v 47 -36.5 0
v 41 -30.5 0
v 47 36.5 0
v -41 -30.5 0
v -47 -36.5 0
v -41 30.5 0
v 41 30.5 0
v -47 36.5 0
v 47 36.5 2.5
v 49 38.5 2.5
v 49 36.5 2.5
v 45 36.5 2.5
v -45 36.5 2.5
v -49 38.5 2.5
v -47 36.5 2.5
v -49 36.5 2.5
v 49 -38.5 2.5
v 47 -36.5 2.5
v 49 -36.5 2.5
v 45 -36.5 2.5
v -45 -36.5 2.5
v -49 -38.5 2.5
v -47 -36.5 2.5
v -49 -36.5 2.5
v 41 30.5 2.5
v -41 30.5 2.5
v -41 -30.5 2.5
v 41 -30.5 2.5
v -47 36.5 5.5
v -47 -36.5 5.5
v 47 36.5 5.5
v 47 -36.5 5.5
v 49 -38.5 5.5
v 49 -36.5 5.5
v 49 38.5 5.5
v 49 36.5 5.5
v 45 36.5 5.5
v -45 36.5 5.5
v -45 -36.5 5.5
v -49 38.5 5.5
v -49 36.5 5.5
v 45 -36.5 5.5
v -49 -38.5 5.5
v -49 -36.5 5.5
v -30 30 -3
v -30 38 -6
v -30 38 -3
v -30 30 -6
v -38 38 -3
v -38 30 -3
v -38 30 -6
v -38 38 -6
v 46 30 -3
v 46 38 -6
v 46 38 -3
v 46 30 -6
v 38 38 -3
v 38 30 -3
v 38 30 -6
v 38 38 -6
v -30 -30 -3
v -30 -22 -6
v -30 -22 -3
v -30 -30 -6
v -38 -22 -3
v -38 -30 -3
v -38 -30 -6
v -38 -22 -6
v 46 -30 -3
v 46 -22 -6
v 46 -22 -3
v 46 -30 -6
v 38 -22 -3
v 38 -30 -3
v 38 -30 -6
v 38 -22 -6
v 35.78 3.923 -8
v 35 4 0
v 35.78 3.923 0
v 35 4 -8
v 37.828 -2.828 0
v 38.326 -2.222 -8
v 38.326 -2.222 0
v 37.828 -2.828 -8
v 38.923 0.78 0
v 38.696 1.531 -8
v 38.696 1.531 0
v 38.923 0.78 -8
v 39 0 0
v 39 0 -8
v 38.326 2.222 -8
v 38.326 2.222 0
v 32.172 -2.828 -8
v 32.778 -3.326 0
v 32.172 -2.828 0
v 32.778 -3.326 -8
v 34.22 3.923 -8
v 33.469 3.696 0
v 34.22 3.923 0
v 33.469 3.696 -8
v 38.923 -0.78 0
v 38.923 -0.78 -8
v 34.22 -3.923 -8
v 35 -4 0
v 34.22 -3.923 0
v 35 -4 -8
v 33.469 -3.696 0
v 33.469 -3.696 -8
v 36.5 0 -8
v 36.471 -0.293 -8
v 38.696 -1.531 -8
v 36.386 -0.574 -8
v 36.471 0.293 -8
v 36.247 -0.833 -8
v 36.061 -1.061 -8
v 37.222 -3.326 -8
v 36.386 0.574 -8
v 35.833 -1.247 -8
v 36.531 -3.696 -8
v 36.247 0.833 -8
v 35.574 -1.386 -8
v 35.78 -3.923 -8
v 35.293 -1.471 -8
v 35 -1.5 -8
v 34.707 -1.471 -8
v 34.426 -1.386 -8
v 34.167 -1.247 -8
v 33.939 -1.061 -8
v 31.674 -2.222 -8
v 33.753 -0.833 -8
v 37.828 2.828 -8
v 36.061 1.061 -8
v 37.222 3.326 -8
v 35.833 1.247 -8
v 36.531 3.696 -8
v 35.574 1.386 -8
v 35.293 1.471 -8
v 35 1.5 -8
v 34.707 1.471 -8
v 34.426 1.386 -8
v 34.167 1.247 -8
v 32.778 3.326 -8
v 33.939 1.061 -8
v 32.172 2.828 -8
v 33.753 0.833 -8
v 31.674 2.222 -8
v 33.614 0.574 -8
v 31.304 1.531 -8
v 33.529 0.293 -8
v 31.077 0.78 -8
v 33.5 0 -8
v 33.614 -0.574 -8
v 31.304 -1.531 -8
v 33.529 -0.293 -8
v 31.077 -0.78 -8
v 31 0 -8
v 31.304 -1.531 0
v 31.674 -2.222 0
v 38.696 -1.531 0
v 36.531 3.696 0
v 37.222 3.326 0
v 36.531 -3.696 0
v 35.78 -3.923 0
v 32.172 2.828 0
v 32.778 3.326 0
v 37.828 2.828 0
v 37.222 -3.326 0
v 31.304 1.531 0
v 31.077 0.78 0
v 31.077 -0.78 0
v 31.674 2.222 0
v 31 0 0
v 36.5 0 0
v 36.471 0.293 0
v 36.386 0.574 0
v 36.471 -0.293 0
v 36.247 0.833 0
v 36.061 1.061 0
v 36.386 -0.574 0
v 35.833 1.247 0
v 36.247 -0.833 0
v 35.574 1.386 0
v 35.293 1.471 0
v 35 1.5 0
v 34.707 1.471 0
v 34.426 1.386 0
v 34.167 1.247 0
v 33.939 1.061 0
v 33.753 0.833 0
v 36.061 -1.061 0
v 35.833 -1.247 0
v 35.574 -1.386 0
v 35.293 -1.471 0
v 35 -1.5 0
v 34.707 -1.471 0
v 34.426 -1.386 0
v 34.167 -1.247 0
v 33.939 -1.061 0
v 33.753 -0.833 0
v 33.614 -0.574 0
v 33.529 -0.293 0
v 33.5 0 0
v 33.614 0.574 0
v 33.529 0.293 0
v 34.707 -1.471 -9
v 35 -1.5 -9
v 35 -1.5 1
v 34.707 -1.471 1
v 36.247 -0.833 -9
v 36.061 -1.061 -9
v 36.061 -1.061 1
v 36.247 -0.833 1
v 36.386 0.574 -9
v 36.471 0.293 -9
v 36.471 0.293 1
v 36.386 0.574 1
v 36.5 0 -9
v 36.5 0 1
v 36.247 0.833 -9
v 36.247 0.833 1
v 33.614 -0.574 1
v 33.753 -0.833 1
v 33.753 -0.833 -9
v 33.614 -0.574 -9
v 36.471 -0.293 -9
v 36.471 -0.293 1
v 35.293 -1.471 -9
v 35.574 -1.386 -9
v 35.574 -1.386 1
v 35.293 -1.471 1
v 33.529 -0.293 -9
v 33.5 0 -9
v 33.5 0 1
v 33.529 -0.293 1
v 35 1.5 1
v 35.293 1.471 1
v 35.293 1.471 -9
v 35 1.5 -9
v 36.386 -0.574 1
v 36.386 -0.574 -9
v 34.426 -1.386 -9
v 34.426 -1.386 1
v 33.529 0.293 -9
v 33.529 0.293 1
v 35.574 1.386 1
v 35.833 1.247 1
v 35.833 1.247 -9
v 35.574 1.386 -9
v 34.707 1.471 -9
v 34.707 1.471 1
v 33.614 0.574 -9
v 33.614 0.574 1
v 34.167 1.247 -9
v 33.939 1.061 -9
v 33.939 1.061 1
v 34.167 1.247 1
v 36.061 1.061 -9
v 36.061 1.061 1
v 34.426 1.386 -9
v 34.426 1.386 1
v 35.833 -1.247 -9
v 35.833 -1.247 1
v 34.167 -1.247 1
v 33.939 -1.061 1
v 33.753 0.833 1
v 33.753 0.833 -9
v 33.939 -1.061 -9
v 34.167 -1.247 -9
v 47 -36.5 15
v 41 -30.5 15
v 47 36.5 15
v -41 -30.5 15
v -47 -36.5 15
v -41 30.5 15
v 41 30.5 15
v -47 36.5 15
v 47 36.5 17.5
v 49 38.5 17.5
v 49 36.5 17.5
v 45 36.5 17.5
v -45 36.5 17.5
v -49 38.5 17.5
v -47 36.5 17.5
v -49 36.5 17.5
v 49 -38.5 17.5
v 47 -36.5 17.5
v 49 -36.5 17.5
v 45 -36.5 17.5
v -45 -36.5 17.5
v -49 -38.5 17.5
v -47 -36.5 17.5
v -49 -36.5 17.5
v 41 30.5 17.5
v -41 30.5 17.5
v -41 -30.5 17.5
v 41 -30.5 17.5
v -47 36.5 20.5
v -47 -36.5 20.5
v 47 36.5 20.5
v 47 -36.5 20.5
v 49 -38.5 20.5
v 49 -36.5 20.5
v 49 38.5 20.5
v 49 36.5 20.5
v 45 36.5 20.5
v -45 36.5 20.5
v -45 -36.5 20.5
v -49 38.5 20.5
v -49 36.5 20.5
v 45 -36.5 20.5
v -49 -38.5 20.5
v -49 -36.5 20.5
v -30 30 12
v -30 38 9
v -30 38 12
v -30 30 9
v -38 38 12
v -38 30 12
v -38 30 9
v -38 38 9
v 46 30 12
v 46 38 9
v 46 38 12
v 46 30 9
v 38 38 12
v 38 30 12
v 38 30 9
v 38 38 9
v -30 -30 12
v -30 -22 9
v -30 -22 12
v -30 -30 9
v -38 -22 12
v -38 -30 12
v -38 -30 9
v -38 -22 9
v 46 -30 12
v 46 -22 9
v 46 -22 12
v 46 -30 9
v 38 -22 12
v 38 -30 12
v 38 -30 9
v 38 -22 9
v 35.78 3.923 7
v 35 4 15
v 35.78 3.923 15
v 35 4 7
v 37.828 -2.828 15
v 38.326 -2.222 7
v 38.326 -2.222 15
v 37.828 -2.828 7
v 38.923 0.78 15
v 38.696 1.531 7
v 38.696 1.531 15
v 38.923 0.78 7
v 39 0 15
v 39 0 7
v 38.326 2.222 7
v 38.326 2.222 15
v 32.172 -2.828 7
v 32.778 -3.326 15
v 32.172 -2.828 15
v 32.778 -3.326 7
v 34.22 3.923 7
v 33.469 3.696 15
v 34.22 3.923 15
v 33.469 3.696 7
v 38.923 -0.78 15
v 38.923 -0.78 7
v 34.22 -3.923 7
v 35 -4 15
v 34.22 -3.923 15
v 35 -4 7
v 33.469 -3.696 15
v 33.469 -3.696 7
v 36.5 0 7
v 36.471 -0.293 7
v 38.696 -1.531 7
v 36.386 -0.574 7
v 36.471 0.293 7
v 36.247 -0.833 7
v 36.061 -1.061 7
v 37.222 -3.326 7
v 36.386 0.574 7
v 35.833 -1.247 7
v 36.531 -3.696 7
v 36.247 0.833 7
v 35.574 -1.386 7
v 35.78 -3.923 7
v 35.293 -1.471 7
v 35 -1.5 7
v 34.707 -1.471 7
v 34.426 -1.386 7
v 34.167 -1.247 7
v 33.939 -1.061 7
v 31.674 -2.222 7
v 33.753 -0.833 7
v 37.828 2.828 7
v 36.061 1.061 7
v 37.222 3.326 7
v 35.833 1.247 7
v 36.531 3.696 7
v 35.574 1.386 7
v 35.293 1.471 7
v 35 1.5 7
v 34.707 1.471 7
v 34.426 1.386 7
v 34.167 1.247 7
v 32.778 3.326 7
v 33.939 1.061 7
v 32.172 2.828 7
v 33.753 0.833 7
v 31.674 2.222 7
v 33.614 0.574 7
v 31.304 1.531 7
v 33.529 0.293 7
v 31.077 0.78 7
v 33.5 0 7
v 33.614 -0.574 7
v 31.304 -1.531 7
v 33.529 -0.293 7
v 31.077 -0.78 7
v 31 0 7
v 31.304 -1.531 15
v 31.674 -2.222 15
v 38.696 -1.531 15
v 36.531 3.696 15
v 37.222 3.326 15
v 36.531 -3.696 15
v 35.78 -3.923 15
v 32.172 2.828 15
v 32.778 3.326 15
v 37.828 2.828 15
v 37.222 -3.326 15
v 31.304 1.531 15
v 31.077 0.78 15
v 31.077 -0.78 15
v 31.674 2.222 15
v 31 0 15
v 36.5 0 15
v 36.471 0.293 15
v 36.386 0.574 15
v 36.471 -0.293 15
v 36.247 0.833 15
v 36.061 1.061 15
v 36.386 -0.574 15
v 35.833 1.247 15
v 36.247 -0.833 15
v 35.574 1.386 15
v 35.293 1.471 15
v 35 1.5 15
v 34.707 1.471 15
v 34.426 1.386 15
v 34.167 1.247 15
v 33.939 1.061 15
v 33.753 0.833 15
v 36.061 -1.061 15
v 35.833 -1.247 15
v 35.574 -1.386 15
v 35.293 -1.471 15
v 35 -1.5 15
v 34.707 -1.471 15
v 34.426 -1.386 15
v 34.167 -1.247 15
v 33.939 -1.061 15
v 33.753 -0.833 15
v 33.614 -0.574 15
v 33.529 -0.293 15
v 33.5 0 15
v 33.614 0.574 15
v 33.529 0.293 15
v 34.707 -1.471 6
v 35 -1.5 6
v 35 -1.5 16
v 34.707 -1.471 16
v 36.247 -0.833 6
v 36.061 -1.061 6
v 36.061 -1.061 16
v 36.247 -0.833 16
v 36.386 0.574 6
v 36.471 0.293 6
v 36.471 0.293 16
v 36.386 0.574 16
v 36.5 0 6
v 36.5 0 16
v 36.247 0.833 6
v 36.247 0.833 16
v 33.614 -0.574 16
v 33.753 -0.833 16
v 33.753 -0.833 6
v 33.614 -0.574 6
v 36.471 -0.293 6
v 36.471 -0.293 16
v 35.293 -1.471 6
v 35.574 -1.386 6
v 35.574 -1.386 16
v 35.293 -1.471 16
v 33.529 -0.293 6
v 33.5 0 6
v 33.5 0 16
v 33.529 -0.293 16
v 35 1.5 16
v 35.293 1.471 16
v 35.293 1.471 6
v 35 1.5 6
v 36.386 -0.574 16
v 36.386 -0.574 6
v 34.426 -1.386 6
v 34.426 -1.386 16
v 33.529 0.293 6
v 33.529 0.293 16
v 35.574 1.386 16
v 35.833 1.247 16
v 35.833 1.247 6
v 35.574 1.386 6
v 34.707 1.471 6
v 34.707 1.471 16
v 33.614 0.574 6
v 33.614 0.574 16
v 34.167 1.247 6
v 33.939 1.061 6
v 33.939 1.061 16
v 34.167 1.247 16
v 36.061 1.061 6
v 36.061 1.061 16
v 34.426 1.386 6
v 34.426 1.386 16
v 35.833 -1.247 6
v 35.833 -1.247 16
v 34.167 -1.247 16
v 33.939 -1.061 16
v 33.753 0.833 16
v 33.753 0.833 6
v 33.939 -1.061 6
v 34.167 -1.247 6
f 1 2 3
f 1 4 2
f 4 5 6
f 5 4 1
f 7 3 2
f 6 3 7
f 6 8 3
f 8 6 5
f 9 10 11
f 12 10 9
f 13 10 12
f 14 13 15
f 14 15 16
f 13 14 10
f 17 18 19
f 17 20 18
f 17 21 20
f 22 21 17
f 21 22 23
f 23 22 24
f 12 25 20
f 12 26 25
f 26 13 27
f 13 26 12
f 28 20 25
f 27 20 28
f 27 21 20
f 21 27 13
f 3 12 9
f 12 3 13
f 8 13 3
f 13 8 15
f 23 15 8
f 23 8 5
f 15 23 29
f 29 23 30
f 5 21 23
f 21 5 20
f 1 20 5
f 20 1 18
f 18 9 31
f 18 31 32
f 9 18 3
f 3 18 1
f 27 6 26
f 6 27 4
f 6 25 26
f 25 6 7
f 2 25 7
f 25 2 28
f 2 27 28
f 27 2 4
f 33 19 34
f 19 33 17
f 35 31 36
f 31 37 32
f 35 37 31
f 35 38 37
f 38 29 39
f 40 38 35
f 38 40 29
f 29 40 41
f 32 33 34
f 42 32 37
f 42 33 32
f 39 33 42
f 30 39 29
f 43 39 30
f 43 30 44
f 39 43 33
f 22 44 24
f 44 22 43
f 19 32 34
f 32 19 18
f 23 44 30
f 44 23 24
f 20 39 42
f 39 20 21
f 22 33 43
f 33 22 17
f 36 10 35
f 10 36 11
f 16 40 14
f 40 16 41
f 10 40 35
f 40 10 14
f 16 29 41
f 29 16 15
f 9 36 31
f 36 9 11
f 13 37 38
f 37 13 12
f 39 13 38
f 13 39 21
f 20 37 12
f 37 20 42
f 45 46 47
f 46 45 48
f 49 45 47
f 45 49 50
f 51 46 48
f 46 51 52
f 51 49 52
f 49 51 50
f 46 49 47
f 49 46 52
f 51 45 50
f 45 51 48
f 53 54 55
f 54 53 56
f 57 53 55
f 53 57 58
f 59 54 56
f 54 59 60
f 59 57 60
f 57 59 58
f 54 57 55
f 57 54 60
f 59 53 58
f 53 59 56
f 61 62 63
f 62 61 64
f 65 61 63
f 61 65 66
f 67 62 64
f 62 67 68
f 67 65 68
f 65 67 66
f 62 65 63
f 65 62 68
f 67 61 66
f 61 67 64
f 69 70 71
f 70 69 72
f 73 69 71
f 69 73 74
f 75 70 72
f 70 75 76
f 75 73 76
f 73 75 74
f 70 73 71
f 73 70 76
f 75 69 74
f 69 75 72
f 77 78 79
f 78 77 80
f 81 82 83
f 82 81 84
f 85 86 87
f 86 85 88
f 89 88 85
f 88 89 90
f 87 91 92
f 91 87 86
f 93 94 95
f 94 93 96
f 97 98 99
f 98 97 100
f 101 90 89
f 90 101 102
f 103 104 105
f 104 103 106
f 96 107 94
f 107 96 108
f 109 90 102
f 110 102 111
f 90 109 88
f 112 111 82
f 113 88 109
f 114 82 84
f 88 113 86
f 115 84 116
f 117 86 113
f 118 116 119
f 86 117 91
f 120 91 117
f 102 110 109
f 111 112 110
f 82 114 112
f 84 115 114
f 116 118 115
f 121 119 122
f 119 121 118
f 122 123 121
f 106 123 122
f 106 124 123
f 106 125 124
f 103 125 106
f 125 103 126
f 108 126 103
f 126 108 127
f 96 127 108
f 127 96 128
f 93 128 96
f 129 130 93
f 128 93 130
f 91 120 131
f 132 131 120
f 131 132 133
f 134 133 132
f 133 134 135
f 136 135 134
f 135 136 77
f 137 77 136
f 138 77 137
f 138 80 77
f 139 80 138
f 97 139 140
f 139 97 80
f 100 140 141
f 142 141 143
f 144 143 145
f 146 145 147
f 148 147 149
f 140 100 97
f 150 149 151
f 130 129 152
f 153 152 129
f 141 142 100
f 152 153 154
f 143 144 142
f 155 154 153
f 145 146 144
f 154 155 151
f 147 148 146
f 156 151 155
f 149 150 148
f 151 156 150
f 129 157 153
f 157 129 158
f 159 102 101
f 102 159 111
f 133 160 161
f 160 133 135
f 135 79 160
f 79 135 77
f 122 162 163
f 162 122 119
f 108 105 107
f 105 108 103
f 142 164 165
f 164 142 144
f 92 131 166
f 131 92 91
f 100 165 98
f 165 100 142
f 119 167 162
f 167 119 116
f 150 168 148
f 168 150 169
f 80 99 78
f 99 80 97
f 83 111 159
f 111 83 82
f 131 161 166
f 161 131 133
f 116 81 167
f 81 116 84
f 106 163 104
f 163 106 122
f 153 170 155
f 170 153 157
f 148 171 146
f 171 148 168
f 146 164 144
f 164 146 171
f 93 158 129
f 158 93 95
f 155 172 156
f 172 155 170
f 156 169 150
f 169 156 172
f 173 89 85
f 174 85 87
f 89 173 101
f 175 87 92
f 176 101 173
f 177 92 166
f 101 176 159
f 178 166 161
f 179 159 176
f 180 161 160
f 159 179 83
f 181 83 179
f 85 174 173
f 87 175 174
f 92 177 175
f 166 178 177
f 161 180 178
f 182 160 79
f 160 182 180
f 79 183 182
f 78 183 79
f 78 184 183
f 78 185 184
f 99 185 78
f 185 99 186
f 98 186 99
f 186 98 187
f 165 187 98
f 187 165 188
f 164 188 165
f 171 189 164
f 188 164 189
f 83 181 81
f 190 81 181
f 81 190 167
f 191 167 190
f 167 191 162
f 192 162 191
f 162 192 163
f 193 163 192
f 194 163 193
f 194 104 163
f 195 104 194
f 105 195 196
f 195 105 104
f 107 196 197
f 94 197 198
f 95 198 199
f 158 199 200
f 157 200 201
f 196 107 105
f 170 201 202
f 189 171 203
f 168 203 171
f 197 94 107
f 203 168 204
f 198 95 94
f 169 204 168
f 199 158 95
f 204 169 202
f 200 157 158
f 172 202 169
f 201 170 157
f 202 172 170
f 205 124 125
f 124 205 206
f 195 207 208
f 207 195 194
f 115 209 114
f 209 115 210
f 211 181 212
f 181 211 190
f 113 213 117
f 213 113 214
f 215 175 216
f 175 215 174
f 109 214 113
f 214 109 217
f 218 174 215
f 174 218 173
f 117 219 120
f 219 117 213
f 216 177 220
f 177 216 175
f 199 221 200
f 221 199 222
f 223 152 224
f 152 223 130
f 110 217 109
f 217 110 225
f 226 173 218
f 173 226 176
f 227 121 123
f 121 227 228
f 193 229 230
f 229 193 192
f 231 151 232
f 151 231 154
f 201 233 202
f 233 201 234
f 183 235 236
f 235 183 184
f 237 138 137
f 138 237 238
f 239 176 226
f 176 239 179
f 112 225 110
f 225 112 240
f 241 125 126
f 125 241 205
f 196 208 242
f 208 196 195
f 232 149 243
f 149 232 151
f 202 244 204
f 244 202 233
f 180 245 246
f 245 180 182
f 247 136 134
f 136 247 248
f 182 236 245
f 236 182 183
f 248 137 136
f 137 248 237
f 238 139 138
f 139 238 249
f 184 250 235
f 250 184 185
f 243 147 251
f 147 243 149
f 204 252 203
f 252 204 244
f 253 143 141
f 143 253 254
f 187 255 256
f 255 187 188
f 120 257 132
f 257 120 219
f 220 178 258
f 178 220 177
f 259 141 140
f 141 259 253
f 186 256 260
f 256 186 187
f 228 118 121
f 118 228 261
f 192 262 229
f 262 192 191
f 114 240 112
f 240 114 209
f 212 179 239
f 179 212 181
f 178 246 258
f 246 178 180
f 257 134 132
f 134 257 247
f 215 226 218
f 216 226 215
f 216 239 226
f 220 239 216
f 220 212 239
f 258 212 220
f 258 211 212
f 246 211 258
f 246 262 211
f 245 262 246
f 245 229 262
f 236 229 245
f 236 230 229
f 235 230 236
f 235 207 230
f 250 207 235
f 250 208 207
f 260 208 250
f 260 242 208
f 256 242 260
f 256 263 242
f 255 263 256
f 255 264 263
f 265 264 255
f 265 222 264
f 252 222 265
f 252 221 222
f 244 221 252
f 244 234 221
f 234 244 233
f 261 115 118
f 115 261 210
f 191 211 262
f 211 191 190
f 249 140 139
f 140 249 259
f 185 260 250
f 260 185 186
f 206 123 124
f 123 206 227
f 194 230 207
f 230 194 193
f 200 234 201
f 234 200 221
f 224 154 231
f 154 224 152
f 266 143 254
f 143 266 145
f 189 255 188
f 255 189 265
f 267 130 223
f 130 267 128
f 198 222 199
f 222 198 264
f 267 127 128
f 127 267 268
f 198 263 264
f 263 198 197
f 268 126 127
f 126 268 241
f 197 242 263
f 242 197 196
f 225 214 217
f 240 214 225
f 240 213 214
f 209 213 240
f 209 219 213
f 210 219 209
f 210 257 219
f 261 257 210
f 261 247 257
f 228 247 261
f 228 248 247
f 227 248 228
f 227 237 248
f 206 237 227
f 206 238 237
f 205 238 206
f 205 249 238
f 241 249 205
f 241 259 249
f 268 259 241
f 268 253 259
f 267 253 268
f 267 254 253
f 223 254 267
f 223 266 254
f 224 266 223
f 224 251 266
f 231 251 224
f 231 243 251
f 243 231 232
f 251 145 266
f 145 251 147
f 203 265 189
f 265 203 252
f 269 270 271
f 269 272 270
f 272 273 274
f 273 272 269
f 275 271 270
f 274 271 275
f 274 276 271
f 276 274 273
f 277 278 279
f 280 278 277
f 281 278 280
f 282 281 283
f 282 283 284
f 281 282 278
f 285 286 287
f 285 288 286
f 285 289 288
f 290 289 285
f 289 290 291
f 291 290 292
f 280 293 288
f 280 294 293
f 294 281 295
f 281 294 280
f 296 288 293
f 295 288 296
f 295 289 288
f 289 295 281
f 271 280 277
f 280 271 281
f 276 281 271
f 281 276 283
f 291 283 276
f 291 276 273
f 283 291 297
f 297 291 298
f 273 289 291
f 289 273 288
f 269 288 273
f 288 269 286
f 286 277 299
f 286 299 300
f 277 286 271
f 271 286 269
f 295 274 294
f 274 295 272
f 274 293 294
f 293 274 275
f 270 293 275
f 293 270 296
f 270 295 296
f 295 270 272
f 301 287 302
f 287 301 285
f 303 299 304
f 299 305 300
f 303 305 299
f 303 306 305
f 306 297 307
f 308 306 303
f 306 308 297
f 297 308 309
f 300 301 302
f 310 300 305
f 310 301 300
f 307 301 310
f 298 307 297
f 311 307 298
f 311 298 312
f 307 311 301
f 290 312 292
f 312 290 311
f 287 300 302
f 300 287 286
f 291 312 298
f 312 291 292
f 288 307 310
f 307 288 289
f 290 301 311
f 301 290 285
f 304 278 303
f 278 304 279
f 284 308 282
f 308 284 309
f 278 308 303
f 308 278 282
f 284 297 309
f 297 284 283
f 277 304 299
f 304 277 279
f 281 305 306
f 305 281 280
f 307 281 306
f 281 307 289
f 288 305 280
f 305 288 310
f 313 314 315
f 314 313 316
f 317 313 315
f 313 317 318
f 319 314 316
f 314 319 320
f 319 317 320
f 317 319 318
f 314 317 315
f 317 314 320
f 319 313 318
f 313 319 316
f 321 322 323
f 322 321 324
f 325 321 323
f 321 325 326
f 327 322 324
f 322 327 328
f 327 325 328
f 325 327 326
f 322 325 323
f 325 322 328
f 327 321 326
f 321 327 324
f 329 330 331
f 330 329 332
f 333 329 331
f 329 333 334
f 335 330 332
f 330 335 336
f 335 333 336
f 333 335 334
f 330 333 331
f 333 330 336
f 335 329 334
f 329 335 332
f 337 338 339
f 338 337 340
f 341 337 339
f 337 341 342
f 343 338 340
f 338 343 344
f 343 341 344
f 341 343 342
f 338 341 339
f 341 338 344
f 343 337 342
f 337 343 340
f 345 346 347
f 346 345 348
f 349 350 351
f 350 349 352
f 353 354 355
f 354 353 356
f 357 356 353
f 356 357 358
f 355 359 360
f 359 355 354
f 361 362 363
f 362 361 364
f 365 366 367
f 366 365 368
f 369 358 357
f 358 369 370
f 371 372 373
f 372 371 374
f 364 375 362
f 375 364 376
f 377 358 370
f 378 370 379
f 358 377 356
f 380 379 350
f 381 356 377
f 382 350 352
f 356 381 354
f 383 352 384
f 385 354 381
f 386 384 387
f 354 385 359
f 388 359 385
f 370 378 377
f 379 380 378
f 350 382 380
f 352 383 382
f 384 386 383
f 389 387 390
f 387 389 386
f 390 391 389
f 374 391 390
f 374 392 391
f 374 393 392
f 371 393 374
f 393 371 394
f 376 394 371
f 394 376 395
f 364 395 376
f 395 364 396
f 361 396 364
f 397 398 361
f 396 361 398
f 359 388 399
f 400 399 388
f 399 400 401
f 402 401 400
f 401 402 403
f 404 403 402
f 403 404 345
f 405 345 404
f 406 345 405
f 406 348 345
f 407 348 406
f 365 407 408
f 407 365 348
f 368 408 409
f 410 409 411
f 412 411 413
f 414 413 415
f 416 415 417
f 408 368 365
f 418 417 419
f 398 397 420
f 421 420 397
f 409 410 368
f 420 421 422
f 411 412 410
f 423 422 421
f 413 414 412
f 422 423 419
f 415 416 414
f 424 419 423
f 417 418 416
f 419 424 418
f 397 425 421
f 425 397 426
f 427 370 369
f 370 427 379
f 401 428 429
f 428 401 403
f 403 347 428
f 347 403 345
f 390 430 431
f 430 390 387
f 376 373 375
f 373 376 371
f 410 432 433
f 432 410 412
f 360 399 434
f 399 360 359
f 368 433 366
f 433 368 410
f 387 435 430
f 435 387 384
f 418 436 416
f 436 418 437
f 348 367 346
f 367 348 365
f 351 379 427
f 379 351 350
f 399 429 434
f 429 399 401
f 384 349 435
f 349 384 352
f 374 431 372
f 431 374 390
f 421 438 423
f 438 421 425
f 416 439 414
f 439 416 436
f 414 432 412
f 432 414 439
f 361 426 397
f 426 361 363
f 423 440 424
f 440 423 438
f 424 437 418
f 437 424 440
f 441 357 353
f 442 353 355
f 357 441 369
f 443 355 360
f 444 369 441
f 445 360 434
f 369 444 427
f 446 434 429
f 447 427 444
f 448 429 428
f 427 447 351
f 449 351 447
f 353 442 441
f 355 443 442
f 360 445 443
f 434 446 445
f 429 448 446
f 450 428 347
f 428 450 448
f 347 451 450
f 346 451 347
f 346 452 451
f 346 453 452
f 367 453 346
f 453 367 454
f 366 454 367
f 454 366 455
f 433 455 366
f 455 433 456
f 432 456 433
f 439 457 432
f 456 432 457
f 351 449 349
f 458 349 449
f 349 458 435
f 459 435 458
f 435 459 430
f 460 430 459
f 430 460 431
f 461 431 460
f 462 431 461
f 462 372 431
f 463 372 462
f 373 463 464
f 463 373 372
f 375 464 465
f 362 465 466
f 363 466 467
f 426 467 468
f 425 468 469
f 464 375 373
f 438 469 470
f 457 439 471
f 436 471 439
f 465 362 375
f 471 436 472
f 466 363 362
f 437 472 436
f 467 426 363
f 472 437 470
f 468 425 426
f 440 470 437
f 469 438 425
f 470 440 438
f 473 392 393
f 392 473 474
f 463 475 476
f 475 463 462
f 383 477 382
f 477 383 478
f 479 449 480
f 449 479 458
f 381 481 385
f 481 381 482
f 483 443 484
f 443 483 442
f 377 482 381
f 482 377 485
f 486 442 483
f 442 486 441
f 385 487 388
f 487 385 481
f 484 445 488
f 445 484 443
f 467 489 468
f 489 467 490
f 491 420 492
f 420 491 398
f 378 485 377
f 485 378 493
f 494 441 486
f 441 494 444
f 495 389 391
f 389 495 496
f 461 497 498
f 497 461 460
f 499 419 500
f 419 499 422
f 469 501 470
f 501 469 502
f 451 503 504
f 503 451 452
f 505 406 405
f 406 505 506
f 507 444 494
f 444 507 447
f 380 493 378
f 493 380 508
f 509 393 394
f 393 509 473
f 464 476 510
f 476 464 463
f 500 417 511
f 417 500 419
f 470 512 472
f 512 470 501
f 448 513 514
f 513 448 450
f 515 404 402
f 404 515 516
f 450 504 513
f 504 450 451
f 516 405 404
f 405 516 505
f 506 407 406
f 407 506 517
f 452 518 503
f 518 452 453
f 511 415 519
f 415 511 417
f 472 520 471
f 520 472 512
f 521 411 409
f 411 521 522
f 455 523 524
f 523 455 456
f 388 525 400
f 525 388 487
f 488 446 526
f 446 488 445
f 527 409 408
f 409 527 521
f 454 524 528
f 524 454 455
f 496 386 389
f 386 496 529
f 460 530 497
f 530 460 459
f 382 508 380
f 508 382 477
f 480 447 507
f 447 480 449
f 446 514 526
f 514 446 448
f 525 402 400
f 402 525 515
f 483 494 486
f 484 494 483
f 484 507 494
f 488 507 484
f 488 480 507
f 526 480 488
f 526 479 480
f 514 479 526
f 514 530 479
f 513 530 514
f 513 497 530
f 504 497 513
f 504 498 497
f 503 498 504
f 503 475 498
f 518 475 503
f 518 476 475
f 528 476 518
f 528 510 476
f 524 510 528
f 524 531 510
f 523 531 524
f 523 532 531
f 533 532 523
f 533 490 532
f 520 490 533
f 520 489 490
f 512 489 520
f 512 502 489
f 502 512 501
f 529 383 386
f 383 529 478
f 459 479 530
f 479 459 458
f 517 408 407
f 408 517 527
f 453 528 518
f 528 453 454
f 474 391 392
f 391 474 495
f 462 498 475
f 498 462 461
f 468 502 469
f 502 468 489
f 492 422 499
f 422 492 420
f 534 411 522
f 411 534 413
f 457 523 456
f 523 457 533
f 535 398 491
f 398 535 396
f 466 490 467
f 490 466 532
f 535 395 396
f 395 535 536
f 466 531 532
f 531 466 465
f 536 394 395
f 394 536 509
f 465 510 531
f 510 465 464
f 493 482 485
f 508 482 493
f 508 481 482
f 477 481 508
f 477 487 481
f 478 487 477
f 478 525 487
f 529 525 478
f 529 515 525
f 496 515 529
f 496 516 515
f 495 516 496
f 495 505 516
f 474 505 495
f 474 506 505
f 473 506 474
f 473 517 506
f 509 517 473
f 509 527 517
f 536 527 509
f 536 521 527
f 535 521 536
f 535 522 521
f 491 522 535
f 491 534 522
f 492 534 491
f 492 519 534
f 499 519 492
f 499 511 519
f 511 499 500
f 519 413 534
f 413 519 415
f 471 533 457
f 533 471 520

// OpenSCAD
// INTEGRATED ANTENNA ANALYZER - DISPLAY BEZEL FOR 3.5" TFT
// Anti-glare frame with touch button access windows
// Mounts to main enclosure via snap-fit tabs

// TFT display dimensions (physical panel)
tft_width = 86;      // mm, active display area ~79mm
tft_height = 65;     // mm, active display area ~57mm
tft_thickness = 2.5; // PCB thickness

// Bezel frame dimensions
bezel_thickness = 2.5;     // Material thickness
bezel_width_outer = tft_width + 8;   // 4mm margin on each side
bezel_height_outer = tft_height + 8; // 4mm margin on top/bottom
bezel_depth = 12;                    // Recessed frame depth (anti-glare lip)

// Anti-glare features
lip_height = 3;     // 3mm lip to shade screen from side reflections
lip_width = 2;      // Thin lip reduces bulk

// Touch button access (capacitive buttons on PCB behind display)
button_window_width = 8;   // mm, hole width
button_window_height = 6;  // mm, hole height
button_count = 3;          // Three touch buttons (menu, up, down)

module bezel_frame() {
  // Outer frame (with anti-glare lip)

  // Main bezel ring
  linear_extrude(height = bezel_thickness) {
    difference() {
      square([bezel_width_outer, bezel_height_outer], center = true);
      square([tft_width - 4, tft_height - 4], center = true);  // Display opening
    }
  }

  // Anti-glare lip (extends inward and upward from bezel edges)
  translate([-(bezel_width_outer/2 + lip_width), -(bezel_height_outer/2 + lip_width), bezel_thickness])
    cube([bezel_width_outer + 2*lip_width, lip_width, lip_height]);  // Left lip

  translate([-(bezel_width_outer/2 + lip_width), bezel_height_outer/2, bezel_thickness])
    cube([bezel_width_outer + 2*lip_width, lip_width, lip_height]);  // Right lip

  translate([-(bezel_width_outer/2), -(bezel_height_outer/2 + lip_width), bezel_thickness])
    cube([lip_width, bezel_height_outer + 2*lip_width, lip_height]);  // Top lip

  translate([bezel_width_outer/2 - lip_width, -(bezel_height_outer/2 + lip_width), bezel_thickness])
    cube([lip_width, bezel_height_outer + 2*lip_width, lip_height]);  // Bottom lip
}

module touch_button_windows() {
  // Three rectangular windows for capacitive touch buttons
  // Buttons positioned along bottom edge of TFT

  window_spacing = (tft_width - 30) / 2;  // Evenly spaced
  window_y = -tft_height/2 + 8;           // 8mm from bottom

  // Left button (MODE / UP)
  translate([-(bezel_width_outer/4), window_y, -0.5])
    cube([button_window_width, button_window_height, bezel_thickness + 1], center = true);

  // Center button (SELECT / MENU)
  translate([0, window_y, -0.5])
    cube([button_window_width, button_window_height, bezel_thickness + 1], center = true);

  // Right button (DOWN / ENTER)
  translate([bezel_width_outer/4, window_y, -0.5])
    cube([button_window_width, button_window_height, bezel_thickness + 1], center = true);
}

module snap_fit_tabs() {
  // Snap-fit tabs that grip recessed opening in main enclosure
  // Four tabs (corners) ensure secure mounting without screws

  tab_width = 8;
  tab_depth = 6;      // Depth of snap engagement
  tab_height = 3;     // Thin for snap flexibility

  // Positions: four corners of bezel
  corner_x = (bezel_width_outer / 2) - 5;
  corner_y = (bezel_height_outer / 2) - 5;

  // Top-left tab
  translate([-(corner_x - tab_width/2), (corner_y - tab_height/2), -tab_depth])
    cube([tab_width, tab_width, tab_height]);

  // Top-right tab
  translate([(corner_x - tab_width/2), (corner_y - tab_height/2), -tab_depth])
    cube([tab_width, tab_width, tab_height]);

  // Bottom-left tab
  translate([-(corner_x - tab_width/2), -(corner_y - tab_height/2), -tab_depth])
    cube([tab_width, tab_width, tab_height]);

  // Bottom-right tab
  translate([(corner_x - tab_width/2), -(corner_y - tab_height/2), -tab_depth])
    cube([tab_width, tab_width, tab_height]);
}

module mounting_boss_for_encoder() {
  // Small boss to support rotary encoder shaft on back side

  boss_radius = 4;
  boss_height = 8;
  boss_x = (bezel_width_outer / 2) - 12;  // Slightly inset from edge

  translate([boss_x, 0, -boss_height])
    cylinder(h = boss_height, r = boss_radius, $fn = 32);

  // Small hole for encoder shaft (3mm)
  translate([boss_x, 0, -boss_height - 1])
    cylinder(h = boss_height + 2, r = 1.5, $fn = 32);
}

module cable_access_slot() {
  // Slot for flat ribbon cable to LCD controller
  // Positioned at bottom-center of bezel (cable runs down the middle)

  slot_width = 10;   // 10mm wide (typical FFC cable width)
  slot_height = 3;   // Thin slot
  slot_length = tft_height / 2;

  translate([-(slot_width/2), -(slot_height/2), -10])
    cube([slot_width, slot_height, 10]);
}

module assembly() {
  // Main assembly (union of all parts)
  union() {
    difference() {
      // Base bezel frame
      bezel_frame();

      // Remove touch button windows
      touch_button_windows();

      // Remove cable access slot
      cable_access_slot();
    }

    // Add snap-fit tabs
    snap_fit_tabs();

    // Add encoder mounting boss (optional, for encoder alignment)
    mounting_boss_for_encoder();
  }
}

// RENDER THE ASSEMBLY
assembly();

// Translate for viewing/printing
translate([0, 0, 15])
  assembly();

// NOTES FOR MANUFACTURING:
// 1. Print in translucent PETG or resin for visibility without full transparency
// 2. Orientation: print with face UP to minimize supports
// 3. Layer height: 0.1mm for smooth display appearance
// 4. Post-processing: sand with 220-400 grit for optical clarity
// 5. Optional: apply matte acrylic spray to reduce glare (5cm distance, light coat)
// 6. Assembly: Snap frame into main enclosure recessed opening
// 7. Adhesive: Optional silicone gasket to prevent dust ingress (not essential)
// 8. Cable routing: FFC ribbon cable runs through bottom slot
// 9. Buttons: Touch sensor buttons are behind window (no mechanical buttons needed)
